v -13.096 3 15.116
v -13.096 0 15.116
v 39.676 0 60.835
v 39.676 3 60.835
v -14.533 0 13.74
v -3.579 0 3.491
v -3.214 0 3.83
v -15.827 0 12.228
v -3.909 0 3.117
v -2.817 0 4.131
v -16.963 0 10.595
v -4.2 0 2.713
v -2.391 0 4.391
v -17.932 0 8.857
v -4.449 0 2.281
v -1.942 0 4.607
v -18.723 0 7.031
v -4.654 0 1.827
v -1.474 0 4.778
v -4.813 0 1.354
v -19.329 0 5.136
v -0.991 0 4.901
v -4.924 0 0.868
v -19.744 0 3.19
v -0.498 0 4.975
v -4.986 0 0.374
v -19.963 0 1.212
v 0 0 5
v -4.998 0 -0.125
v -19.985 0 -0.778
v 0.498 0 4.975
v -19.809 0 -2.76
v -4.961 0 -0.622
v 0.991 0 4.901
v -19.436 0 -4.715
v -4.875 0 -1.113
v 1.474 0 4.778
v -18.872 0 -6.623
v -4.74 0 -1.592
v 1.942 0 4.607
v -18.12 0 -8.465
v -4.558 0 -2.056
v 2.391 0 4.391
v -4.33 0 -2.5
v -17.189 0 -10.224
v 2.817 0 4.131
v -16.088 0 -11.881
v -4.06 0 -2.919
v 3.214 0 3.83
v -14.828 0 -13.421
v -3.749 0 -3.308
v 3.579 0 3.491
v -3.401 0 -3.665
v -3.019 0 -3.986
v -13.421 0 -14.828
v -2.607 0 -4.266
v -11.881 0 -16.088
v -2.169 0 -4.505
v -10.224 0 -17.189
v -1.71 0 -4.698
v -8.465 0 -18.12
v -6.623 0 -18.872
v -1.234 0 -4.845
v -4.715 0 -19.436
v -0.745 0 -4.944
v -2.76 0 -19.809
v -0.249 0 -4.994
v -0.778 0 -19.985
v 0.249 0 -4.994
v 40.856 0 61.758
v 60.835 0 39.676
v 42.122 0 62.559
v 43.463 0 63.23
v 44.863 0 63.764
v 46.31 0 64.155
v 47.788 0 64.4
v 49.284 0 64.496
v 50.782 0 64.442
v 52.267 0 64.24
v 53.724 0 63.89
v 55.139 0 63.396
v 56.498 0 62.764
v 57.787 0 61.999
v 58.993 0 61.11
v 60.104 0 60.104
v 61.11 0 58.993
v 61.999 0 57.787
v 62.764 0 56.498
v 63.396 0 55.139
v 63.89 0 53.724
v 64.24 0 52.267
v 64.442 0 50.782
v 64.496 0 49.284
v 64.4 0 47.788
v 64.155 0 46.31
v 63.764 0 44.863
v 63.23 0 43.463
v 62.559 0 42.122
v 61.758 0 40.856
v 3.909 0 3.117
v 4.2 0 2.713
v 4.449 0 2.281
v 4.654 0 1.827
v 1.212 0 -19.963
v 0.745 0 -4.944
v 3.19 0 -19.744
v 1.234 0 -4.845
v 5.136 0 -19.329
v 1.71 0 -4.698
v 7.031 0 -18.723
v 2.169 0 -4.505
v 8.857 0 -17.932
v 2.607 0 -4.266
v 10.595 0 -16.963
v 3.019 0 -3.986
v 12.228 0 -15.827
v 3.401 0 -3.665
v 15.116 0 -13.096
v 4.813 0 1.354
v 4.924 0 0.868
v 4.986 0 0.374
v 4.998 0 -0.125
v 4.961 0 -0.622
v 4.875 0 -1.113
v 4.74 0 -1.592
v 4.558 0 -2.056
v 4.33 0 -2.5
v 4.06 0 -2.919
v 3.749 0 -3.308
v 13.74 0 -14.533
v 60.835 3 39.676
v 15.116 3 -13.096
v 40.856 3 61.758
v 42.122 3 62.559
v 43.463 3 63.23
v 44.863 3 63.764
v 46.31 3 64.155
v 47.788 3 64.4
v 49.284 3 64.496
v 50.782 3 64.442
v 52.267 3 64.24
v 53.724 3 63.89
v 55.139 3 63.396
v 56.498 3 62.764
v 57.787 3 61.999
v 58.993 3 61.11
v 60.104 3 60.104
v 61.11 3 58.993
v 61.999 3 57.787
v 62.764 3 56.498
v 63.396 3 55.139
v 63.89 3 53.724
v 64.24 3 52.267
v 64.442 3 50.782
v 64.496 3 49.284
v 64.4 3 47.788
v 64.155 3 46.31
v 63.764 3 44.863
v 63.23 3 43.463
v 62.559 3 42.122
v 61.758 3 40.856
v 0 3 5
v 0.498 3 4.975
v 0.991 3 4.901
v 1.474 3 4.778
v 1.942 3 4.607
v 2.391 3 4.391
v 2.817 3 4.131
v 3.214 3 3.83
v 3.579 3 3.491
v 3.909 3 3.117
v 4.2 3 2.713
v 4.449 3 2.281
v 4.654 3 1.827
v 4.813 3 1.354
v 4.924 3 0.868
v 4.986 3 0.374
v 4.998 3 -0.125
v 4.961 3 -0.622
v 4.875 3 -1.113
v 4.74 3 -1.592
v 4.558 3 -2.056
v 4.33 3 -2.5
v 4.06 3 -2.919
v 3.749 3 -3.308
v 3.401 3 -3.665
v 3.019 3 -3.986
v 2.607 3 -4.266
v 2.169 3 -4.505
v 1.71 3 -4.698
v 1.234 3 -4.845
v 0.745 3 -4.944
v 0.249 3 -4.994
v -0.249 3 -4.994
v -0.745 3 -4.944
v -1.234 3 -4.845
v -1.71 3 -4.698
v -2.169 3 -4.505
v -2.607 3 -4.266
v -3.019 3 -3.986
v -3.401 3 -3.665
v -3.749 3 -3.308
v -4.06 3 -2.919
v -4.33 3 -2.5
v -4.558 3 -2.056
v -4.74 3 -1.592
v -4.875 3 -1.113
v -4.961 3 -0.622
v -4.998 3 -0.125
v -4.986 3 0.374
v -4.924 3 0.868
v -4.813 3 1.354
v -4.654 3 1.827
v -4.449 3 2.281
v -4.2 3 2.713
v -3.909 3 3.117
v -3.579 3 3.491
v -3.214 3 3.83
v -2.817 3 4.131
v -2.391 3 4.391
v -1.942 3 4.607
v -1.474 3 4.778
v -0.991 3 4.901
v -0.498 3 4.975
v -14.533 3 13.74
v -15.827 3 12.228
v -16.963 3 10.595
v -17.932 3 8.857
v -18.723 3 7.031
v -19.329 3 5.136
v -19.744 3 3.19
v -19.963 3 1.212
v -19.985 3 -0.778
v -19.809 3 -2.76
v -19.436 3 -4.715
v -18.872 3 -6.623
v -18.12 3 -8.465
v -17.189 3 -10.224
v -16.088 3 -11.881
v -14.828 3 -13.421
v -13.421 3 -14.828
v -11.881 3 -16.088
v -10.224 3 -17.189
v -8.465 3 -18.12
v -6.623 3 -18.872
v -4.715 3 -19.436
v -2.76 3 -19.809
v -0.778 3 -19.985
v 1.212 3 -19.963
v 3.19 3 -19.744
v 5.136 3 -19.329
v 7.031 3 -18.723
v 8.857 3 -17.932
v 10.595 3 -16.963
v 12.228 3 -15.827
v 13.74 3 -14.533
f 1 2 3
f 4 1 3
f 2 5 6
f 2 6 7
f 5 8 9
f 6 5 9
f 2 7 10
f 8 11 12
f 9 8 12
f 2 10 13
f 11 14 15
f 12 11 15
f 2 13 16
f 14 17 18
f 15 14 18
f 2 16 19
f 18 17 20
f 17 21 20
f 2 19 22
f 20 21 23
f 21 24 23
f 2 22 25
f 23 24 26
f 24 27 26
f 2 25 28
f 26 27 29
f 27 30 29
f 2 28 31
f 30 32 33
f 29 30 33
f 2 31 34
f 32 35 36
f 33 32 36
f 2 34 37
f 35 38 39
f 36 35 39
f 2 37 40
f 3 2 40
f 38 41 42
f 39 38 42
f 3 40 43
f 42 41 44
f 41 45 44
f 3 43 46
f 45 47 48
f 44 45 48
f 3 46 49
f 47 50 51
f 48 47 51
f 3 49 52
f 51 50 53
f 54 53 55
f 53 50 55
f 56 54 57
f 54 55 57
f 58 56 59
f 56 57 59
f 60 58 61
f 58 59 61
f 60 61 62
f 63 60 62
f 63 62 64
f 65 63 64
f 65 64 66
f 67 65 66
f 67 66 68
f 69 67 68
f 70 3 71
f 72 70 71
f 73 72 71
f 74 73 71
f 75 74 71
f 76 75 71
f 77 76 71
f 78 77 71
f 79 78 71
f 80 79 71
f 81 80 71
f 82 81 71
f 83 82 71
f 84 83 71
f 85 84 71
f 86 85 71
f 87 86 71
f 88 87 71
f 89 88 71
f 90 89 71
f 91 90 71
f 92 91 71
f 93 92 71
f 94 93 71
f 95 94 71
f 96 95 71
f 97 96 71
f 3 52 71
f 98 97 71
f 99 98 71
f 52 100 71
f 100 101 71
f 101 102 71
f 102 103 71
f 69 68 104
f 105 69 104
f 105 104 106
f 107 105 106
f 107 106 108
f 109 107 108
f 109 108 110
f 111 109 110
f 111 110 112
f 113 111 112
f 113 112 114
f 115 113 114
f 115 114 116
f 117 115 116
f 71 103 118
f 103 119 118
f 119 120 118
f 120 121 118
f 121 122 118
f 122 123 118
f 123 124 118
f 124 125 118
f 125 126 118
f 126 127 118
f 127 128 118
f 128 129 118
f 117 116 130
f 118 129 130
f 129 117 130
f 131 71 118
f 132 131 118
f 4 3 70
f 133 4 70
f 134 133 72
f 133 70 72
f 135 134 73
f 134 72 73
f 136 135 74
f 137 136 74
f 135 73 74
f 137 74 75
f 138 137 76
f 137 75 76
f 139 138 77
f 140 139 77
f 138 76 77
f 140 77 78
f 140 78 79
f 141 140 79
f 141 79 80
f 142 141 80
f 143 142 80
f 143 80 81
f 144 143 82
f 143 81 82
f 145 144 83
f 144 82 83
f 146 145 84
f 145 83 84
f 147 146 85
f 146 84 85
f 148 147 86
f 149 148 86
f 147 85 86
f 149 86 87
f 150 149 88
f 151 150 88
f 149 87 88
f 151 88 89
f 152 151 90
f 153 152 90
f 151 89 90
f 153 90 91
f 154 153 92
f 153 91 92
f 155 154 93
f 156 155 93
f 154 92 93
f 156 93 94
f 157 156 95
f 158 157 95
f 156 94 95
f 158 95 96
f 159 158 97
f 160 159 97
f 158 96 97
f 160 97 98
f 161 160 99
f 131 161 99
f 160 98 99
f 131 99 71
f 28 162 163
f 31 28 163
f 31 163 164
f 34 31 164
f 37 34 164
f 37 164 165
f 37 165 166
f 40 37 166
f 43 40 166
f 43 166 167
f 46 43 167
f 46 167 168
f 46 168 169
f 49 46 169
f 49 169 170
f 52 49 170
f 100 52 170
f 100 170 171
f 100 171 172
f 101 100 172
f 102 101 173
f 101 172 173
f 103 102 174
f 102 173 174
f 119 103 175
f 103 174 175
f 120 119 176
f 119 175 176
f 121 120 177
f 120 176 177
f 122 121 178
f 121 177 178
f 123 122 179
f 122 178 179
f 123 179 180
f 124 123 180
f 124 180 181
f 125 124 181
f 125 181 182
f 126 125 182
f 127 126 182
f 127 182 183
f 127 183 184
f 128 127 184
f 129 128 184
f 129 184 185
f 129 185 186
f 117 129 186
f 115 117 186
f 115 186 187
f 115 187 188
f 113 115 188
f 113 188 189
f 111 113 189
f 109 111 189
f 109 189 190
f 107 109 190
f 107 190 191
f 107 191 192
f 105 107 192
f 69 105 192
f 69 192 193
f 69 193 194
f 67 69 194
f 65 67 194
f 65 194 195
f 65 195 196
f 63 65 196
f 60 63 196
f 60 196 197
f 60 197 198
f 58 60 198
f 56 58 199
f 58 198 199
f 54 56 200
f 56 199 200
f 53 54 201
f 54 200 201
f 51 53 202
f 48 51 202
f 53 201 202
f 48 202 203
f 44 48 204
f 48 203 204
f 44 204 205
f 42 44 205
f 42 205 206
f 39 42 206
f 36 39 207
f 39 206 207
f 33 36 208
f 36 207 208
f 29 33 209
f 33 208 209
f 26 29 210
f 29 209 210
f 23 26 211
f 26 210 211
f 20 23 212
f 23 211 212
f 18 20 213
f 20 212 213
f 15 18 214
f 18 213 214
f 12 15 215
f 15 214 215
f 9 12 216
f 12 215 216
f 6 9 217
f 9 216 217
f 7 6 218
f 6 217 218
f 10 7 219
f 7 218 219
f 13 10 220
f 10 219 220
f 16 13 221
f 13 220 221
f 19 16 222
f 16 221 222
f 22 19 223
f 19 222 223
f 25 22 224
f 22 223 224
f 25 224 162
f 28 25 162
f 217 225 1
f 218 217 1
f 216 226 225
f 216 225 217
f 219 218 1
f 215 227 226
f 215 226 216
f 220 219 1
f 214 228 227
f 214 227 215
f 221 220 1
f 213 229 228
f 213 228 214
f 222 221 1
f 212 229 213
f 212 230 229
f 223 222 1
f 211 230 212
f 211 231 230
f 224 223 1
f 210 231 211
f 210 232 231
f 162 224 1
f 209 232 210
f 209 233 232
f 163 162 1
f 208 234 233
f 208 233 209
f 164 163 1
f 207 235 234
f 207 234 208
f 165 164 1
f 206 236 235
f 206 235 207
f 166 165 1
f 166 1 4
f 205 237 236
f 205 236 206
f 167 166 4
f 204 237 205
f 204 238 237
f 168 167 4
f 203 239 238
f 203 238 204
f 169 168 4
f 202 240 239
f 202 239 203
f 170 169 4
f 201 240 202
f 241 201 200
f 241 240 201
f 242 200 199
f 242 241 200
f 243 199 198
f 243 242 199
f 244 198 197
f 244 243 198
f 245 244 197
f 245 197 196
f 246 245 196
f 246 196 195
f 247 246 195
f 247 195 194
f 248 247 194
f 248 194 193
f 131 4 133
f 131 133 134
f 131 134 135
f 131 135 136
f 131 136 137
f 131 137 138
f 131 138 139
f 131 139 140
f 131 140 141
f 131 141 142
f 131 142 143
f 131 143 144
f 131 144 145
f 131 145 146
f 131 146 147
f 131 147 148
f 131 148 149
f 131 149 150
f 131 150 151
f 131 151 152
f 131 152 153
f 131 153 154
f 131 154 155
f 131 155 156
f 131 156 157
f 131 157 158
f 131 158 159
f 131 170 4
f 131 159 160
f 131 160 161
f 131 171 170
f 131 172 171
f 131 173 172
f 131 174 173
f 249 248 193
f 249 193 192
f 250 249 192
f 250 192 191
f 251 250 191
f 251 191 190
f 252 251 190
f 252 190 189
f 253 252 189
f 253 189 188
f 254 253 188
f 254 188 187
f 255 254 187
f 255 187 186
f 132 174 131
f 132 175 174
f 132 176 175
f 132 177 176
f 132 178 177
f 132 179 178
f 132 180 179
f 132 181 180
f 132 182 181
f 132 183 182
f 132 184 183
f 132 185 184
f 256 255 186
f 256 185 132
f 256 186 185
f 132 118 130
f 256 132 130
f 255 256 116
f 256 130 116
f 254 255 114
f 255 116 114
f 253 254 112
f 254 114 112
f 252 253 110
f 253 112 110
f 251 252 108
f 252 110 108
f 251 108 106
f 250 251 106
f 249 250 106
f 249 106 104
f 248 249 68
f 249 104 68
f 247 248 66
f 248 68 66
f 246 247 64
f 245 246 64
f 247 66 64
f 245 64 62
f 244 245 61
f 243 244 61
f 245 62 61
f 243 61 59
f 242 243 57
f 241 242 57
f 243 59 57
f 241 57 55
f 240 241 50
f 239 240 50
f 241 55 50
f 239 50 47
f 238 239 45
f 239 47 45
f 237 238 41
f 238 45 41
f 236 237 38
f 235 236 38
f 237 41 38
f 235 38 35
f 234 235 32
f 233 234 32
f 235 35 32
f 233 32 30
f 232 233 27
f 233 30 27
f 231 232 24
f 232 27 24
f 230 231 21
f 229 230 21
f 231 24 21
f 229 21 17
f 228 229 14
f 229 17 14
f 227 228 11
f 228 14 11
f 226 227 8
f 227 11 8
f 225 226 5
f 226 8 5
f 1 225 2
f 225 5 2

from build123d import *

# Parameters (mm, degrees)
SKETCH_1_R          = 20
SKETCH_1_R_2        = 15
EXTRUDE_1_DEPTH     = 3
SKETCH_2_R          = 2.5
CUT_EXTRUDE_1_DEPTH = 92.262525064
SKETCH_3_R          = 5
CUT_EXTRUDE_2_DEPTH = 10


with BuildPart() as part:
    # 草图1 → 凸台-拉伸1 (new body)
    with BuildSketch(Plane(origin=(0, 0, 0), x_dir=(1, 0, 0), z_dir=(0, 1, 0))):
        Circle(SKETCH_1_R)
        with BuildLine():
            ThreePointArc((20, 0), (8.309115435, -18.192267607), (-13.095860068, -15.116165158))
            Line((-13.095860068, -15.116165158), (39.675579632, -60.834598551))
            ThreePointArc((39.675579632, -60.834598551), (38.890872965, -38.890872965), (60.834598551, -39.675579632))
            Line((60.834598551, -39.675579632), (15.116165158, 13.095860068))
            ThreePointArc((15.116165158, 13.095860068), (18.73930766, 6.98844392), (20, 0))
        make_face()
        with Locations((49.497474683, -49.497474683)):
            Circle(SKETCH_1_R_2)
    extrude(amount=EXTRUDE_1_DEPTH)

    # 草图2 → 切除-拉伸1 (cut, through all)
    with BuildSketch(Plane(origin=(0, 3, 0), x_dir=(1, 0, 0), z_dir=(0, 1, 0))):
        with Locations(Location((0, 0, 0), (0, 0, 270))):
            Circle(SKETCH_2_R)
    extrude(amount=-CUT_EXTRUDE_1_DEPTH, mode=Mode.SUBTRACT)

    # 草图3 → 切除-拉伸2 (cut)
    with BuildSketch(Plane(origin=(0, 3, 0), x_dir=(1, 0, 0), z_dir=(0, 1, 0))):
        with Locations(Location((0, 0, 0), (0, 0, 270))):
            Circle(SKETCH_3_R)
    extrude(amount=-CUT_EXTRUDE_2_DEPTH, mode=Mode.SUBTRACT)


solid = part.part
